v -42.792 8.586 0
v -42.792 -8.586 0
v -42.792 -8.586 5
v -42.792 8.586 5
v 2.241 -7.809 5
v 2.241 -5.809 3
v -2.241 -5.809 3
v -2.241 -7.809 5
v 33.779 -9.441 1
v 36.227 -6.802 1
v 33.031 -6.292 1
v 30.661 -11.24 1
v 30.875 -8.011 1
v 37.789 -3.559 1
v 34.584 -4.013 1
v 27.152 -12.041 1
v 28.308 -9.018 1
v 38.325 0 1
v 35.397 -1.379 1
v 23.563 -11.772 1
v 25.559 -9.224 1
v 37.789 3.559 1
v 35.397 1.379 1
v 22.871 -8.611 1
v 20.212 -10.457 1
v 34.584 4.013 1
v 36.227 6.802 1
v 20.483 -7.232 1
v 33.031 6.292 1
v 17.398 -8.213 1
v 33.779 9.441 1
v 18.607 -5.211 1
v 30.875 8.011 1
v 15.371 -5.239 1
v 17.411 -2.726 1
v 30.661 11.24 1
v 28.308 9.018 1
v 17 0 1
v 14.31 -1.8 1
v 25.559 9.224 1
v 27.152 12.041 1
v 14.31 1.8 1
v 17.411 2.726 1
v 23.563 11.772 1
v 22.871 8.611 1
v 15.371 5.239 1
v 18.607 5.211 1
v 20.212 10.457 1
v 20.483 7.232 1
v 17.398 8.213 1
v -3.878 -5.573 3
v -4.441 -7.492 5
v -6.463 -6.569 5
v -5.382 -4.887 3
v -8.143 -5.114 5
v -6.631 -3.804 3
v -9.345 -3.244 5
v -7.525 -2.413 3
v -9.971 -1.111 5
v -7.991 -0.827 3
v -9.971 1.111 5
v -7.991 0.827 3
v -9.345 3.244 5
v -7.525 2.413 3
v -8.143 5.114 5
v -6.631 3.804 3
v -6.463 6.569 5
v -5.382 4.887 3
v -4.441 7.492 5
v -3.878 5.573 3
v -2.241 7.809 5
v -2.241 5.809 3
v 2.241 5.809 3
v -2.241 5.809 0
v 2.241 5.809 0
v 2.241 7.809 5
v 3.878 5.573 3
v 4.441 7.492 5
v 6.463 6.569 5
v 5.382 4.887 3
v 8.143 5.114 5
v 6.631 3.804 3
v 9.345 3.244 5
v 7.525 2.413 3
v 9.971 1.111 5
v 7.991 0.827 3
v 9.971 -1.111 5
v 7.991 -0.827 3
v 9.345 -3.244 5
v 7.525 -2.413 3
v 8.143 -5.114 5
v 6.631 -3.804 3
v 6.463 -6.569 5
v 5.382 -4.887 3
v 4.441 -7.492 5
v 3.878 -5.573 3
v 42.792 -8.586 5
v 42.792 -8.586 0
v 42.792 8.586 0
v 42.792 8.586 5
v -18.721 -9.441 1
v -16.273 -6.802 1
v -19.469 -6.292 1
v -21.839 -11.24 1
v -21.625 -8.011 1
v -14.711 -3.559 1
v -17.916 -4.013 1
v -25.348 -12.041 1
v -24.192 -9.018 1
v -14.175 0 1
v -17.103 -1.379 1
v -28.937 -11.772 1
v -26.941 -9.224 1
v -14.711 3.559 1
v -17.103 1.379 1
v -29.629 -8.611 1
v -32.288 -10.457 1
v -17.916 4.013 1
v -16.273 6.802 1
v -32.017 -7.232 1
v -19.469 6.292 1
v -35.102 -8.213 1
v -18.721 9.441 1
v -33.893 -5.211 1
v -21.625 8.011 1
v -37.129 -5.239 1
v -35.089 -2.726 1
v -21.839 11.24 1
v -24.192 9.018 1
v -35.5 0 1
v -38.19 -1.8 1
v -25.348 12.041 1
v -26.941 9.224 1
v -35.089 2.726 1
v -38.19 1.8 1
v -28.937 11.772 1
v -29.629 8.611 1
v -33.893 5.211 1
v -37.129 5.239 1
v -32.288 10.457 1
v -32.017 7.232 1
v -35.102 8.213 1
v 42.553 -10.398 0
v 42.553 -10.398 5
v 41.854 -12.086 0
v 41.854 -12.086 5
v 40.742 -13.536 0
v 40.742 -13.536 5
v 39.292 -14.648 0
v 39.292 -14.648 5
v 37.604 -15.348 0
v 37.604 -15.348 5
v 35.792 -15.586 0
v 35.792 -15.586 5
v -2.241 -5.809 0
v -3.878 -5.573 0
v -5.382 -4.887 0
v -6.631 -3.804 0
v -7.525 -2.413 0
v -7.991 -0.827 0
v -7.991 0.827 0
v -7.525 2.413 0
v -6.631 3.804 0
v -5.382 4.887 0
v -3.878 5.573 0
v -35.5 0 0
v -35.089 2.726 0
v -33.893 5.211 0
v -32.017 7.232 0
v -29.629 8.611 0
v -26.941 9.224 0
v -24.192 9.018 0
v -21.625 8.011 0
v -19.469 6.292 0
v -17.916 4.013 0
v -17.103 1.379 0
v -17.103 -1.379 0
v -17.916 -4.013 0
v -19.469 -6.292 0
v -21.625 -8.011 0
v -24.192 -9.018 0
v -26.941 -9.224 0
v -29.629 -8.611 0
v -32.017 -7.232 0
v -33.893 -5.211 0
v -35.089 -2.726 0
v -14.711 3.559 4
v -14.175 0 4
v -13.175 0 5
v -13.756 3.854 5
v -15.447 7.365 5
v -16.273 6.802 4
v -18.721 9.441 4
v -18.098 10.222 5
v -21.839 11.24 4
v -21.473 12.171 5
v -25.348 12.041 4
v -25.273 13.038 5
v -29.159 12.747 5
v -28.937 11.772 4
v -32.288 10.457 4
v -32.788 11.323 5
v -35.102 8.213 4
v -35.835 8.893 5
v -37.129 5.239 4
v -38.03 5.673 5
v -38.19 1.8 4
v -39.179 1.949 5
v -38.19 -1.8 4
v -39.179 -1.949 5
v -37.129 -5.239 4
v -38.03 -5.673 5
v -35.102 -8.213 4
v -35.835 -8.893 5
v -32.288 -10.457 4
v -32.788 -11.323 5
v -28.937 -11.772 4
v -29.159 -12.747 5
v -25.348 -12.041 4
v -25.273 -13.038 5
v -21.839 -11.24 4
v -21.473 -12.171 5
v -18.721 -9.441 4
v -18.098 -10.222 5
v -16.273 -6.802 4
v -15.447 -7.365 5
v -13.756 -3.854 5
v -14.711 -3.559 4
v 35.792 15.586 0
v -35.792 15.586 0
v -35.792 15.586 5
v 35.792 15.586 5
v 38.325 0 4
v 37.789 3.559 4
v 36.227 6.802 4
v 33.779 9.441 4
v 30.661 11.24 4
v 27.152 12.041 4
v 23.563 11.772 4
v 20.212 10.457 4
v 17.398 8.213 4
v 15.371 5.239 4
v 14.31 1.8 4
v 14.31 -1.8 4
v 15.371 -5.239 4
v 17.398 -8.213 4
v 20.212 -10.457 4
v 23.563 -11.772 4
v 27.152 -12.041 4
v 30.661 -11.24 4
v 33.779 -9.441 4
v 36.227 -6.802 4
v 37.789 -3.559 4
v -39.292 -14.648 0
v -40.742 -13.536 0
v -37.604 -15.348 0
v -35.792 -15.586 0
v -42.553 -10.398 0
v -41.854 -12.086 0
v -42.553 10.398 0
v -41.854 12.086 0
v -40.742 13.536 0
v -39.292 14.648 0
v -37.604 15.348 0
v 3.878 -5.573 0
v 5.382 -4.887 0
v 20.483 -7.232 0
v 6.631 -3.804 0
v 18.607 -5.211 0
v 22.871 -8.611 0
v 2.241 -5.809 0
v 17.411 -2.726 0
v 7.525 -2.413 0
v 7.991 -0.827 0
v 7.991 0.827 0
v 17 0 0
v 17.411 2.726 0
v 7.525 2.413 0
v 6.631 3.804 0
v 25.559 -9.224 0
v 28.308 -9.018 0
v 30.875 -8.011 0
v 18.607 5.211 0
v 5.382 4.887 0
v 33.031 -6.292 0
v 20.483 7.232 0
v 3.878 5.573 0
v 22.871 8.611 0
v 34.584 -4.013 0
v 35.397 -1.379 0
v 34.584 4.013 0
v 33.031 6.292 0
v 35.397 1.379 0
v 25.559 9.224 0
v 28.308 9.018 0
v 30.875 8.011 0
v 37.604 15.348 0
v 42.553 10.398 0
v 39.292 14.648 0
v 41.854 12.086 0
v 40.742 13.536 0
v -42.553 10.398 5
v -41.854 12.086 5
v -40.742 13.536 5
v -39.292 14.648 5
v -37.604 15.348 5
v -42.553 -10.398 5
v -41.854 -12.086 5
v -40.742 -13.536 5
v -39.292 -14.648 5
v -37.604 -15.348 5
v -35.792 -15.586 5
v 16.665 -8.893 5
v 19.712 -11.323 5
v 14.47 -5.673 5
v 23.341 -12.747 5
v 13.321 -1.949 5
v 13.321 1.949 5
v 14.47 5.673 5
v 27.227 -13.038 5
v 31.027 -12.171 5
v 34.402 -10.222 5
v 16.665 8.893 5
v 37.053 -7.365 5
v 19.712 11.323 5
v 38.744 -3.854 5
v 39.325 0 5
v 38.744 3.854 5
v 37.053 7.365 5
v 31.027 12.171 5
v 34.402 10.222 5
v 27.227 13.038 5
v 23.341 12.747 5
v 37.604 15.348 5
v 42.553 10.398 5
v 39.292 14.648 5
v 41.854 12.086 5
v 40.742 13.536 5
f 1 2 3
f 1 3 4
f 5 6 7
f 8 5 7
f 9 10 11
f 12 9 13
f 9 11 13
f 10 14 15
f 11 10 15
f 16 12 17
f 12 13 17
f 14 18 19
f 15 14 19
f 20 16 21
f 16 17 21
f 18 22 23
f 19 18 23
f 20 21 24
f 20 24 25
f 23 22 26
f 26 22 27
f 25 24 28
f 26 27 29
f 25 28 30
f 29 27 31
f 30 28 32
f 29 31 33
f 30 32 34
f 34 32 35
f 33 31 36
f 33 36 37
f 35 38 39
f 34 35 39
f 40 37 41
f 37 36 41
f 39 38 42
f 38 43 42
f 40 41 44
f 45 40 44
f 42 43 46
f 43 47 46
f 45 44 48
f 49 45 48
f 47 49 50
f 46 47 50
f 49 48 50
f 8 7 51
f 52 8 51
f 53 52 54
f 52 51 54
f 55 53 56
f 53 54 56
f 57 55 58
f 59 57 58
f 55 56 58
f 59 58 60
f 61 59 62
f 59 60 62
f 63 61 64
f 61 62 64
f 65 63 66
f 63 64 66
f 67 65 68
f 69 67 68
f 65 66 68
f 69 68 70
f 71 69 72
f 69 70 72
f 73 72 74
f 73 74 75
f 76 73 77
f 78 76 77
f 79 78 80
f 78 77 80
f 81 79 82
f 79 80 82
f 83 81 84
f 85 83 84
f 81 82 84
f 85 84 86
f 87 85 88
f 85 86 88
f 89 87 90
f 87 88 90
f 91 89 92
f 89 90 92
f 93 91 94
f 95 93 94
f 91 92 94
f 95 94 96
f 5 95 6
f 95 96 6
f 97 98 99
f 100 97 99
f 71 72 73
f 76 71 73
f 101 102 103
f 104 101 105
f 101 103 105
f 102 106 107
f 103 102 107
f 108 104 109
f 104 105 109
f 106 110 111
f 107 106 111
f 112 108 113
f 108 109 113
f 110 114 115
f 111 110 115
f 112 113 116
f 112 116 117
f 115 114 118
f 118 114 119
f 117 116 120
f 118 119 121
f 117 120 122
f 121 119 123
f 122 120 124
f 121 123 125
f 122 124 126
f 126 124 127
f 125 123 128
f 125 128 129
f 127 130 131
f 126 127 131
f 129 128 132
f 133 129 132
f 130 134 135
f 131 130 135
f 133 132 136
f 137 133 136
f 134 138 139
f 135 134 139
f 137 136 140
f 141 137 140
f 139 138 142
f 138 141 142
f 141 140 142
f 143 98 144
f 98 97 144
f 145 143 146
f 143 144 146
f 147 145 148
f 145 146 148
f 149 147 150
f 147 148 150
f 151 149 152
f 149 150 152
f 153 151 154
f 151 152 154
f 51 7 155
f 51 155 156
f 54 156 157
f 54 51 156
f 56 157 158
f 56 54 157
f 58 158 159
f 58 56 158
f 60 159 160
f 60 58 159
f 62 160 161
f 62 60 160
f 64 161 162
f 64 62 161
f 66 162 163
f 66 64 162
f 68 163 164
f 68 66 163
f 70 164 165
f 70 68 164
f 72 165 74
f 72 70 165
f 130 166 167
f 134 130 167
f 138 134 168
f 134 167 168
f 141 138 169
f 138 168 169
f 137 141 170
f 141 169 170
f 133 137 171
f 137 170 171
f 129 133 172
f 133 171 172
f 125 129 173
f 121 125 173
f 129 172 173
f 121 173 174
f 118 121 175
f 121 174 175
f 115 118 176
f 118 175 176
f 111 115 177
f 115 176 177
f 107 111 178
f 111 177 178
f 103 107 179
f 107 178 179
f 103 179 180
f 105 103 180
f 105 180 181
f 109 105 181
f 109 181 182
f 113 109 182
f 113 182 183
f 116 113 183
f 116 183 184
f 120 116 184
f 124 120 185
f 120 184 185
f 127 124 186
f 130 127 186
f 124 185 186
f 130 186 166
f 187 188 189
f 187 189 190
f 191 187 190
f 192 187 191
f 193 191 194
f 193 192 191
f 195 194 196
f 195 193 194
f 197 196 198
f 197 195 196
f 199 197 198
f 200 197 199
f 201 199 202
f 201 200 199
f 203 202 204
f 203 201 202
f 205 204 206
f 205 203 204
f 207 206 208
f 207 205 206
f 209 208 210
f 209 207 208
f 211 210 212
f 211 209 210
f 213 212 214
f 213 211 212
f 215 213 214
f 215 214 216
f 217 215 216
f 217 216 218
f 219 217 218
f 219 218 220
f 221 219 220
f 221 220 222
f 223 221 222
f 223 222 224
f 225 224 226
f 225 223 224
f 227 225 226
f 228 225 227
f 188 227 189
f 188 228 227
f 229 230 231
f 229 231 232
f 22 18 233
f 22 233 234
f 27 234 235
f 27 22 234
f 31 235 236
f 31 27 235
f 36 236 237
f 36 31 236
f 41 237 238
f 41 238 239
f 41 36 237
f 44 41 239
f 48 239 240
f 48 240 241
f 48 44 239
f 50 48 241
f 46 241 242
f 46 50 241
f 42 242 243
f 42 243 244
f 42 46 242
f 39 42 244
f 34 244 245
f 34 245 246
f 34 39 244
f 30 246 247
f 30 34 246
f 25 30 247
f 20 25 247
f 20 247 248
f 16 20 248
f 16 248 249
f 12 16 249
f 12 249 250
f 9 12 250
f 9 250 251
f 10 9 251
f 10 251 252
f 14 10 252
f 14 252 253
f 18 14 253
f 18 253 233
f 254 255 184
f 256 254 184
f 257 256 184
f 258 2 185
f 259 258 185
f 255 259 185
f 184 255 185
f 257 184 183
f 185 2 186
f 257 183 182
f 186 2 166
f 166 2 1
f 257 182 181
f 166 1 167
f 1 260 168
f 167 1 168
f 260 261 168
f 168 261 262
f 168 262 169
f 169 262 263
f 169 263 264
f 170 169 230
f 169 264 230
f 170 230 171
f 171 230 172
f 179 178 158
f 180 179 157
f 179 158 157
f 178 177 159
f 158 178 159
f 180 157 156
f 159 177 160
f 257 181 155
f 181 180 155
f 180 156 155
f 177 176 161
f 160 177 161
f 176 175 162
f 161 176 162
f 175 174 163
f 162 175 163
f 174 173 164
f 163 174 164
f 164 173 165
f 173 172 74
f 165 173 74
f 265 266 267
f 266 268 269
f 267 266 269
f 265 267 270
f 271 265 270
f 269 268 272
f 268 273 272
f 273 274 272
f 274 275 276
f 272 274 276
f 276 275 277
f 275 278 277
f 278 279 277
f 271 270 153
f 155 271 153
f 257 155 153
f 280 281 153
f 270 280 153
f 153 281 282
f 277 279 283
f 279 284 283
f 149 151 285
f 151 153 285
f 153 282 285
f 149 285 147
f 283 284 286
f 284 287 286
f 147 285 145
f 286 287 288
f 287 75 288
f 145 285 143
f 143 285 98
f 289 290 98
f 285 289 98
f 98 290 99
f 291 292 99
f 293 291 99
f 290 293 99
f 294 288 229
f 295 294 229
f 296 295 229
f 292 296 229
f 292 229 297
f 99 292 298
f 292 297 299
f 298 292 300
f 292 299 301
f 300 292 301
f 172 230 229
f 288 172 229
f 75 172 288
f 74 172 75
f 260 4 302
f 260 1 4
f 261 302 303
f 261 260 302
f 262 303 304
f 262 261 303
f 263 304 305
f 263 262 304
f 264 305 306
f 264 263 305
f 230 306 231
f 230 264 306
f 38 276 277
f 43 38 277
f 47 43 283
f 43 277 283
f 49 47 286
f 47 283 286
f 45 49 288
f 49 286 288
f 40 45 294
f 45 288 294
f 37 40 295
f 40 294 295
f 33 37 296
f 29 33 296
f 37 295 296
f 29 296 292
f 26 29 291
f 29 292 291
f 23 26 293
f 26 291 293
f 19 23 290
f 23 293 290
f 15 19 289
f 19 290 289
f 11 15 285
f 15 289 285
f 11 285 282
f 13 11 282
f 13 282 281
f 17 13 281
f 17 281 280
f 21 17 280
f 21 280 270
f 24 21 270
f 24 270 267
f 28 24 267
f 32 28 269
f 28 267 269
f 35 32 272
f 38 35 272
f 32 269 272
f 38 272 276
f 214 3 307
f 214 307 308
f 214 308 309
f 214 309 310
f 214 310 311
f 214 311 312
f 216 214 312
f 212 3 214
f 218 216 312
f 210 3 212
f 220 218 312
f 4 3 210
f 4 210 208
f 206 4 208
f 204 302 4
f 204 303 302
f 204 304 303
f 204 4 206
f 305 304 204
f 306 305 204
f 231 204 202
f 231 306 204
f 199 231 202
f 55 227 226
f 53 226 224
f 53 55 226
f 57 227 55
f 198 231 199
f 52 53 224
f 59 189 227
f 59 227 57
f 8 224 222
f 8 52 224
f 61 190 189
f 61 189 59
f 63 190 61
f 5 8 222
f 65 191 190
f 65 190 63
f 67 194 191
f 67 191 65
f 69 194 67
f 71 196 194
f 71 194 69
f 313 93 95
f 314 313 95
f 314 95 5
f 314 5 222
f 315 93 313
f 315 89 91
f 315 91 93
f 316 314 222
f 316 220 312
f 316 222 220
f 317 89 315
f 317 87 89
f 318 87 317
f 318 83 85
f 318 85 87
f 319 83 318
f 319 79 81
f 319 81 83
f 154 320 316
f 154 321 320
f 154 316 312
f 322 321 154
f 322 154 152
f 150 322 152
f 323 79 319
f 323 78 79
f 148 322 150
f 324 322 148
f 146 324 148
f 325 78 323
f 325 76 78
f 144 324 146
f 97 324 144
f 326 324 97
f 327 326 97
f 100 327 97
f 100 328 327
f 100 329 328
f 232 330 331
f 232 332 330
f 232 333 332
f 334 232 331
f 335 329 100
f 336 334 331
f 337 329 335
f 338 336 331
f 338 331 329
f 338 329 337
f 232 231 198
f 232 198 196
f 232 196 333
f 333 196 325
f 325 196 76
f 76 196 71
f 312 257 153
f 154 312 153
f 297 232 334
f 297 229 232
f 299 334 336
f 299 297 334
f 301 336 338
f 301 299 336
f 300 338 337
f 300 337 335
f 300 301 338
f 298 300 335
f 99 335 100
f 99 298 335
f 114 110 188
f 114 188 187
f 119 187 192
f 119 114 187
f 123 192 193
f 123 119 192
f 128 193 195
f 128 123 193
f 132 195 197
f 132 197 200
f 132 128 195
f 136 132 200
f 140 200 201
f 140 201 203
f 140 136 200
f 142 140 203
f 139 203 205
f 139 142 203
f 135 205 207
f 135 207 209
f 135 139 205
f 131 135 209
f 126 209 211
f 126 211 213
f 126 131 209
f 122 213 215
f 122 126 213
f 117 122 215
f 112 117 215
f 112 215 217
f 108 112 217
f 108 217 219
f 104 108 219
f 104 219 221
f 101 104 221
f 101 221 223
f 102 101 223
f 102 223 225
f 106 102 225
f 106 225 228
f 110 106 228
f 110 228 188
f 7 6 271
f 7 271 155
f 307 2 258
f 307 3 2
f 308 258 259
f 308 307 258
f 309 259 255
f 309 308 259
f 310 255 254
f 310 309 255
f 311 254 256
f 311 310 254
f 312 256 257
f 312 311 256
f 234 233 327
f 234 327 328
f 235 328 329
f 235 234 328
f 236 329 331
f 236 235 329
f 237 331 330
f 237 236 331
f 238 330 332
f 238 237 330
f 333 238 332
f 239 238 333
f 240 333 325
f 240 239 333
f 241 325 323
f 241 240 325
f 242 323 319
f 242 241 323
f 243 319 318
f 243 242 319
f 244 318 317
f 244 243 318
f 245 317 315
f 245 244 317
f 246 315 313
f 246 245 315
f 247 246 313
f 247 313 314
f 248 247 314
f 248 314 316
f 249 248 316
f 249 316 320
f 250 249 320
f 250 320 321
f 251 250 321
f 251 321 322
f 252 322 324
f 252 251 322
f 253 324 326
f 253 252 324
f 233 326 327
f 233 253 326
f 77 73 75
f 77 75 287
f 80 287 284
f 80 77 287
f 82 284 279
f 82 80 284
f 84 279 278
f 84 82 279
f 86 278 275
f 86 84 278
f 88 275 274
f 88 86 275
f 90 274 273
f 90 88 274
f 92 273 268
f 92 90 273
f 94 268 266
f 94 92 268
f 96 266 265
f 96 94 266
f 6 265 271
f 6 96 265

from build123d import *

# Parameters (mm, degrees)
CROQUIS1_W              = 85.583933156
CROQUIS1_H              = 31.172413686
CROQUIS1_R              = 12.075
SALIENTE_EXTRUIR1_DEPTH = 5
CROQUIS2_W              = 85.583933156
CROQUIS2_H              = 31.172413686
CROQUIS2_R              = 9.25
SALIENTE_EXTRUIR2_DEPTH = 1
REDONDEO1_R             = 7
CORTAR_EXTRUIR1_DEPTH   = 46.815742353
CHAFL_N1_SIZE           = 2
CHAFL_N2_SIZE           = 1


with BuildPart() as part:
    # Croquis1 → Saliente-Extruir1 (new body)
    with BuildSketch(Plane.XY):
        Rectangle(CROQUIS1_W, CROQUIS1_H)
        with Locations((-26.25, 0)):
            Circle(CROQUIS1_R, mode=Mode.SUBTRACT)
        with Locations((26.25, 0)):
            Circle(CROQUIS1_R, mode=Mode.SUBTRACT)
    extrude(amount=SALIENTE_EXTRUIR1_DEPTH)

    # Croquis2 → Saliente-Extruir2 (add)
    with BuildSketch(Plane(origin=(0, 0, 0), x_dir=(-1, 0, 0), z_dir=(0, 0, -1))):
        Rectangle(CROQUIS2_W, CROQUIS2_H)
        with Locations((-26.25, 0)):
            Circle(CROQUIS2_R, mode=Mode.SUBTRACT)
        with Locations((26.25, 0)):
            Circle(CROQUIS2_R, mode=Mode.SUBTRACT)
    extrude(amount=-SALIENTE_EXTRUIR2_DEPTH)

    # Redondeo1
    redondeo1_edges = [part.edges().sort_by_distance(p)[0] for p in [
        (42.791966578, -15.586206843, 2.5),
        (-42.791966578, -15.586206843, 2.5),
        (-42.791966578, 15.586206843, 2.5),
        (42.791966578, 15.586206843, 2.5),
    ]]
    fillet(redondeo1_edges, radius=REDONDEO1_R)

    # Croquis3 → Cortar-Extruir1 (cut, through all)
    with BuildSketch(Plane.XY.offset(5)):
        with BuildLine():
            Line((-2.24145708, 5.808706223), (2.24145708, 5.808706223))
            ThreePointArc((2.24145708, 5.808706223), (8.050163302, 0), (2.24145708, -5.808706223))
            Line((2.24145708, -5.808706223), (-2.24145708, -5.808706223))
            ThreePointArc((-2.24145708, -5.808706223), (-8.050163302, 0), (-2.24145708, 5.808706223))
        make_face()
    extrude(amount=-CORTAR_EXTRUIR1_DEPTH, mode=Mode.SUBTRACT)

    # Chaflán1
    chafl_n1_edges = [part.edges().sort_by_distance(p)[0] for p in [
        (-8.050163302, 0, 5),
        (0, -5.808706223, 5),
        (8.050163302, 0, 5),
        (0, 5.808706223, 5),
    ]]
    chamfer(chafl_n1_edges, length=CHAFL_N1_SIZE)

    # Chaflán2
    chafl_n2_edges = [part.edges().sort_by_distance(p)[0] for p in [
        (-38.325, 0, 5),
        (14.175, 0, 5),
    ]]
    chamfer(chafl_n2_edges, length=CHAFL_N2_SIZE)


solid = part.part
